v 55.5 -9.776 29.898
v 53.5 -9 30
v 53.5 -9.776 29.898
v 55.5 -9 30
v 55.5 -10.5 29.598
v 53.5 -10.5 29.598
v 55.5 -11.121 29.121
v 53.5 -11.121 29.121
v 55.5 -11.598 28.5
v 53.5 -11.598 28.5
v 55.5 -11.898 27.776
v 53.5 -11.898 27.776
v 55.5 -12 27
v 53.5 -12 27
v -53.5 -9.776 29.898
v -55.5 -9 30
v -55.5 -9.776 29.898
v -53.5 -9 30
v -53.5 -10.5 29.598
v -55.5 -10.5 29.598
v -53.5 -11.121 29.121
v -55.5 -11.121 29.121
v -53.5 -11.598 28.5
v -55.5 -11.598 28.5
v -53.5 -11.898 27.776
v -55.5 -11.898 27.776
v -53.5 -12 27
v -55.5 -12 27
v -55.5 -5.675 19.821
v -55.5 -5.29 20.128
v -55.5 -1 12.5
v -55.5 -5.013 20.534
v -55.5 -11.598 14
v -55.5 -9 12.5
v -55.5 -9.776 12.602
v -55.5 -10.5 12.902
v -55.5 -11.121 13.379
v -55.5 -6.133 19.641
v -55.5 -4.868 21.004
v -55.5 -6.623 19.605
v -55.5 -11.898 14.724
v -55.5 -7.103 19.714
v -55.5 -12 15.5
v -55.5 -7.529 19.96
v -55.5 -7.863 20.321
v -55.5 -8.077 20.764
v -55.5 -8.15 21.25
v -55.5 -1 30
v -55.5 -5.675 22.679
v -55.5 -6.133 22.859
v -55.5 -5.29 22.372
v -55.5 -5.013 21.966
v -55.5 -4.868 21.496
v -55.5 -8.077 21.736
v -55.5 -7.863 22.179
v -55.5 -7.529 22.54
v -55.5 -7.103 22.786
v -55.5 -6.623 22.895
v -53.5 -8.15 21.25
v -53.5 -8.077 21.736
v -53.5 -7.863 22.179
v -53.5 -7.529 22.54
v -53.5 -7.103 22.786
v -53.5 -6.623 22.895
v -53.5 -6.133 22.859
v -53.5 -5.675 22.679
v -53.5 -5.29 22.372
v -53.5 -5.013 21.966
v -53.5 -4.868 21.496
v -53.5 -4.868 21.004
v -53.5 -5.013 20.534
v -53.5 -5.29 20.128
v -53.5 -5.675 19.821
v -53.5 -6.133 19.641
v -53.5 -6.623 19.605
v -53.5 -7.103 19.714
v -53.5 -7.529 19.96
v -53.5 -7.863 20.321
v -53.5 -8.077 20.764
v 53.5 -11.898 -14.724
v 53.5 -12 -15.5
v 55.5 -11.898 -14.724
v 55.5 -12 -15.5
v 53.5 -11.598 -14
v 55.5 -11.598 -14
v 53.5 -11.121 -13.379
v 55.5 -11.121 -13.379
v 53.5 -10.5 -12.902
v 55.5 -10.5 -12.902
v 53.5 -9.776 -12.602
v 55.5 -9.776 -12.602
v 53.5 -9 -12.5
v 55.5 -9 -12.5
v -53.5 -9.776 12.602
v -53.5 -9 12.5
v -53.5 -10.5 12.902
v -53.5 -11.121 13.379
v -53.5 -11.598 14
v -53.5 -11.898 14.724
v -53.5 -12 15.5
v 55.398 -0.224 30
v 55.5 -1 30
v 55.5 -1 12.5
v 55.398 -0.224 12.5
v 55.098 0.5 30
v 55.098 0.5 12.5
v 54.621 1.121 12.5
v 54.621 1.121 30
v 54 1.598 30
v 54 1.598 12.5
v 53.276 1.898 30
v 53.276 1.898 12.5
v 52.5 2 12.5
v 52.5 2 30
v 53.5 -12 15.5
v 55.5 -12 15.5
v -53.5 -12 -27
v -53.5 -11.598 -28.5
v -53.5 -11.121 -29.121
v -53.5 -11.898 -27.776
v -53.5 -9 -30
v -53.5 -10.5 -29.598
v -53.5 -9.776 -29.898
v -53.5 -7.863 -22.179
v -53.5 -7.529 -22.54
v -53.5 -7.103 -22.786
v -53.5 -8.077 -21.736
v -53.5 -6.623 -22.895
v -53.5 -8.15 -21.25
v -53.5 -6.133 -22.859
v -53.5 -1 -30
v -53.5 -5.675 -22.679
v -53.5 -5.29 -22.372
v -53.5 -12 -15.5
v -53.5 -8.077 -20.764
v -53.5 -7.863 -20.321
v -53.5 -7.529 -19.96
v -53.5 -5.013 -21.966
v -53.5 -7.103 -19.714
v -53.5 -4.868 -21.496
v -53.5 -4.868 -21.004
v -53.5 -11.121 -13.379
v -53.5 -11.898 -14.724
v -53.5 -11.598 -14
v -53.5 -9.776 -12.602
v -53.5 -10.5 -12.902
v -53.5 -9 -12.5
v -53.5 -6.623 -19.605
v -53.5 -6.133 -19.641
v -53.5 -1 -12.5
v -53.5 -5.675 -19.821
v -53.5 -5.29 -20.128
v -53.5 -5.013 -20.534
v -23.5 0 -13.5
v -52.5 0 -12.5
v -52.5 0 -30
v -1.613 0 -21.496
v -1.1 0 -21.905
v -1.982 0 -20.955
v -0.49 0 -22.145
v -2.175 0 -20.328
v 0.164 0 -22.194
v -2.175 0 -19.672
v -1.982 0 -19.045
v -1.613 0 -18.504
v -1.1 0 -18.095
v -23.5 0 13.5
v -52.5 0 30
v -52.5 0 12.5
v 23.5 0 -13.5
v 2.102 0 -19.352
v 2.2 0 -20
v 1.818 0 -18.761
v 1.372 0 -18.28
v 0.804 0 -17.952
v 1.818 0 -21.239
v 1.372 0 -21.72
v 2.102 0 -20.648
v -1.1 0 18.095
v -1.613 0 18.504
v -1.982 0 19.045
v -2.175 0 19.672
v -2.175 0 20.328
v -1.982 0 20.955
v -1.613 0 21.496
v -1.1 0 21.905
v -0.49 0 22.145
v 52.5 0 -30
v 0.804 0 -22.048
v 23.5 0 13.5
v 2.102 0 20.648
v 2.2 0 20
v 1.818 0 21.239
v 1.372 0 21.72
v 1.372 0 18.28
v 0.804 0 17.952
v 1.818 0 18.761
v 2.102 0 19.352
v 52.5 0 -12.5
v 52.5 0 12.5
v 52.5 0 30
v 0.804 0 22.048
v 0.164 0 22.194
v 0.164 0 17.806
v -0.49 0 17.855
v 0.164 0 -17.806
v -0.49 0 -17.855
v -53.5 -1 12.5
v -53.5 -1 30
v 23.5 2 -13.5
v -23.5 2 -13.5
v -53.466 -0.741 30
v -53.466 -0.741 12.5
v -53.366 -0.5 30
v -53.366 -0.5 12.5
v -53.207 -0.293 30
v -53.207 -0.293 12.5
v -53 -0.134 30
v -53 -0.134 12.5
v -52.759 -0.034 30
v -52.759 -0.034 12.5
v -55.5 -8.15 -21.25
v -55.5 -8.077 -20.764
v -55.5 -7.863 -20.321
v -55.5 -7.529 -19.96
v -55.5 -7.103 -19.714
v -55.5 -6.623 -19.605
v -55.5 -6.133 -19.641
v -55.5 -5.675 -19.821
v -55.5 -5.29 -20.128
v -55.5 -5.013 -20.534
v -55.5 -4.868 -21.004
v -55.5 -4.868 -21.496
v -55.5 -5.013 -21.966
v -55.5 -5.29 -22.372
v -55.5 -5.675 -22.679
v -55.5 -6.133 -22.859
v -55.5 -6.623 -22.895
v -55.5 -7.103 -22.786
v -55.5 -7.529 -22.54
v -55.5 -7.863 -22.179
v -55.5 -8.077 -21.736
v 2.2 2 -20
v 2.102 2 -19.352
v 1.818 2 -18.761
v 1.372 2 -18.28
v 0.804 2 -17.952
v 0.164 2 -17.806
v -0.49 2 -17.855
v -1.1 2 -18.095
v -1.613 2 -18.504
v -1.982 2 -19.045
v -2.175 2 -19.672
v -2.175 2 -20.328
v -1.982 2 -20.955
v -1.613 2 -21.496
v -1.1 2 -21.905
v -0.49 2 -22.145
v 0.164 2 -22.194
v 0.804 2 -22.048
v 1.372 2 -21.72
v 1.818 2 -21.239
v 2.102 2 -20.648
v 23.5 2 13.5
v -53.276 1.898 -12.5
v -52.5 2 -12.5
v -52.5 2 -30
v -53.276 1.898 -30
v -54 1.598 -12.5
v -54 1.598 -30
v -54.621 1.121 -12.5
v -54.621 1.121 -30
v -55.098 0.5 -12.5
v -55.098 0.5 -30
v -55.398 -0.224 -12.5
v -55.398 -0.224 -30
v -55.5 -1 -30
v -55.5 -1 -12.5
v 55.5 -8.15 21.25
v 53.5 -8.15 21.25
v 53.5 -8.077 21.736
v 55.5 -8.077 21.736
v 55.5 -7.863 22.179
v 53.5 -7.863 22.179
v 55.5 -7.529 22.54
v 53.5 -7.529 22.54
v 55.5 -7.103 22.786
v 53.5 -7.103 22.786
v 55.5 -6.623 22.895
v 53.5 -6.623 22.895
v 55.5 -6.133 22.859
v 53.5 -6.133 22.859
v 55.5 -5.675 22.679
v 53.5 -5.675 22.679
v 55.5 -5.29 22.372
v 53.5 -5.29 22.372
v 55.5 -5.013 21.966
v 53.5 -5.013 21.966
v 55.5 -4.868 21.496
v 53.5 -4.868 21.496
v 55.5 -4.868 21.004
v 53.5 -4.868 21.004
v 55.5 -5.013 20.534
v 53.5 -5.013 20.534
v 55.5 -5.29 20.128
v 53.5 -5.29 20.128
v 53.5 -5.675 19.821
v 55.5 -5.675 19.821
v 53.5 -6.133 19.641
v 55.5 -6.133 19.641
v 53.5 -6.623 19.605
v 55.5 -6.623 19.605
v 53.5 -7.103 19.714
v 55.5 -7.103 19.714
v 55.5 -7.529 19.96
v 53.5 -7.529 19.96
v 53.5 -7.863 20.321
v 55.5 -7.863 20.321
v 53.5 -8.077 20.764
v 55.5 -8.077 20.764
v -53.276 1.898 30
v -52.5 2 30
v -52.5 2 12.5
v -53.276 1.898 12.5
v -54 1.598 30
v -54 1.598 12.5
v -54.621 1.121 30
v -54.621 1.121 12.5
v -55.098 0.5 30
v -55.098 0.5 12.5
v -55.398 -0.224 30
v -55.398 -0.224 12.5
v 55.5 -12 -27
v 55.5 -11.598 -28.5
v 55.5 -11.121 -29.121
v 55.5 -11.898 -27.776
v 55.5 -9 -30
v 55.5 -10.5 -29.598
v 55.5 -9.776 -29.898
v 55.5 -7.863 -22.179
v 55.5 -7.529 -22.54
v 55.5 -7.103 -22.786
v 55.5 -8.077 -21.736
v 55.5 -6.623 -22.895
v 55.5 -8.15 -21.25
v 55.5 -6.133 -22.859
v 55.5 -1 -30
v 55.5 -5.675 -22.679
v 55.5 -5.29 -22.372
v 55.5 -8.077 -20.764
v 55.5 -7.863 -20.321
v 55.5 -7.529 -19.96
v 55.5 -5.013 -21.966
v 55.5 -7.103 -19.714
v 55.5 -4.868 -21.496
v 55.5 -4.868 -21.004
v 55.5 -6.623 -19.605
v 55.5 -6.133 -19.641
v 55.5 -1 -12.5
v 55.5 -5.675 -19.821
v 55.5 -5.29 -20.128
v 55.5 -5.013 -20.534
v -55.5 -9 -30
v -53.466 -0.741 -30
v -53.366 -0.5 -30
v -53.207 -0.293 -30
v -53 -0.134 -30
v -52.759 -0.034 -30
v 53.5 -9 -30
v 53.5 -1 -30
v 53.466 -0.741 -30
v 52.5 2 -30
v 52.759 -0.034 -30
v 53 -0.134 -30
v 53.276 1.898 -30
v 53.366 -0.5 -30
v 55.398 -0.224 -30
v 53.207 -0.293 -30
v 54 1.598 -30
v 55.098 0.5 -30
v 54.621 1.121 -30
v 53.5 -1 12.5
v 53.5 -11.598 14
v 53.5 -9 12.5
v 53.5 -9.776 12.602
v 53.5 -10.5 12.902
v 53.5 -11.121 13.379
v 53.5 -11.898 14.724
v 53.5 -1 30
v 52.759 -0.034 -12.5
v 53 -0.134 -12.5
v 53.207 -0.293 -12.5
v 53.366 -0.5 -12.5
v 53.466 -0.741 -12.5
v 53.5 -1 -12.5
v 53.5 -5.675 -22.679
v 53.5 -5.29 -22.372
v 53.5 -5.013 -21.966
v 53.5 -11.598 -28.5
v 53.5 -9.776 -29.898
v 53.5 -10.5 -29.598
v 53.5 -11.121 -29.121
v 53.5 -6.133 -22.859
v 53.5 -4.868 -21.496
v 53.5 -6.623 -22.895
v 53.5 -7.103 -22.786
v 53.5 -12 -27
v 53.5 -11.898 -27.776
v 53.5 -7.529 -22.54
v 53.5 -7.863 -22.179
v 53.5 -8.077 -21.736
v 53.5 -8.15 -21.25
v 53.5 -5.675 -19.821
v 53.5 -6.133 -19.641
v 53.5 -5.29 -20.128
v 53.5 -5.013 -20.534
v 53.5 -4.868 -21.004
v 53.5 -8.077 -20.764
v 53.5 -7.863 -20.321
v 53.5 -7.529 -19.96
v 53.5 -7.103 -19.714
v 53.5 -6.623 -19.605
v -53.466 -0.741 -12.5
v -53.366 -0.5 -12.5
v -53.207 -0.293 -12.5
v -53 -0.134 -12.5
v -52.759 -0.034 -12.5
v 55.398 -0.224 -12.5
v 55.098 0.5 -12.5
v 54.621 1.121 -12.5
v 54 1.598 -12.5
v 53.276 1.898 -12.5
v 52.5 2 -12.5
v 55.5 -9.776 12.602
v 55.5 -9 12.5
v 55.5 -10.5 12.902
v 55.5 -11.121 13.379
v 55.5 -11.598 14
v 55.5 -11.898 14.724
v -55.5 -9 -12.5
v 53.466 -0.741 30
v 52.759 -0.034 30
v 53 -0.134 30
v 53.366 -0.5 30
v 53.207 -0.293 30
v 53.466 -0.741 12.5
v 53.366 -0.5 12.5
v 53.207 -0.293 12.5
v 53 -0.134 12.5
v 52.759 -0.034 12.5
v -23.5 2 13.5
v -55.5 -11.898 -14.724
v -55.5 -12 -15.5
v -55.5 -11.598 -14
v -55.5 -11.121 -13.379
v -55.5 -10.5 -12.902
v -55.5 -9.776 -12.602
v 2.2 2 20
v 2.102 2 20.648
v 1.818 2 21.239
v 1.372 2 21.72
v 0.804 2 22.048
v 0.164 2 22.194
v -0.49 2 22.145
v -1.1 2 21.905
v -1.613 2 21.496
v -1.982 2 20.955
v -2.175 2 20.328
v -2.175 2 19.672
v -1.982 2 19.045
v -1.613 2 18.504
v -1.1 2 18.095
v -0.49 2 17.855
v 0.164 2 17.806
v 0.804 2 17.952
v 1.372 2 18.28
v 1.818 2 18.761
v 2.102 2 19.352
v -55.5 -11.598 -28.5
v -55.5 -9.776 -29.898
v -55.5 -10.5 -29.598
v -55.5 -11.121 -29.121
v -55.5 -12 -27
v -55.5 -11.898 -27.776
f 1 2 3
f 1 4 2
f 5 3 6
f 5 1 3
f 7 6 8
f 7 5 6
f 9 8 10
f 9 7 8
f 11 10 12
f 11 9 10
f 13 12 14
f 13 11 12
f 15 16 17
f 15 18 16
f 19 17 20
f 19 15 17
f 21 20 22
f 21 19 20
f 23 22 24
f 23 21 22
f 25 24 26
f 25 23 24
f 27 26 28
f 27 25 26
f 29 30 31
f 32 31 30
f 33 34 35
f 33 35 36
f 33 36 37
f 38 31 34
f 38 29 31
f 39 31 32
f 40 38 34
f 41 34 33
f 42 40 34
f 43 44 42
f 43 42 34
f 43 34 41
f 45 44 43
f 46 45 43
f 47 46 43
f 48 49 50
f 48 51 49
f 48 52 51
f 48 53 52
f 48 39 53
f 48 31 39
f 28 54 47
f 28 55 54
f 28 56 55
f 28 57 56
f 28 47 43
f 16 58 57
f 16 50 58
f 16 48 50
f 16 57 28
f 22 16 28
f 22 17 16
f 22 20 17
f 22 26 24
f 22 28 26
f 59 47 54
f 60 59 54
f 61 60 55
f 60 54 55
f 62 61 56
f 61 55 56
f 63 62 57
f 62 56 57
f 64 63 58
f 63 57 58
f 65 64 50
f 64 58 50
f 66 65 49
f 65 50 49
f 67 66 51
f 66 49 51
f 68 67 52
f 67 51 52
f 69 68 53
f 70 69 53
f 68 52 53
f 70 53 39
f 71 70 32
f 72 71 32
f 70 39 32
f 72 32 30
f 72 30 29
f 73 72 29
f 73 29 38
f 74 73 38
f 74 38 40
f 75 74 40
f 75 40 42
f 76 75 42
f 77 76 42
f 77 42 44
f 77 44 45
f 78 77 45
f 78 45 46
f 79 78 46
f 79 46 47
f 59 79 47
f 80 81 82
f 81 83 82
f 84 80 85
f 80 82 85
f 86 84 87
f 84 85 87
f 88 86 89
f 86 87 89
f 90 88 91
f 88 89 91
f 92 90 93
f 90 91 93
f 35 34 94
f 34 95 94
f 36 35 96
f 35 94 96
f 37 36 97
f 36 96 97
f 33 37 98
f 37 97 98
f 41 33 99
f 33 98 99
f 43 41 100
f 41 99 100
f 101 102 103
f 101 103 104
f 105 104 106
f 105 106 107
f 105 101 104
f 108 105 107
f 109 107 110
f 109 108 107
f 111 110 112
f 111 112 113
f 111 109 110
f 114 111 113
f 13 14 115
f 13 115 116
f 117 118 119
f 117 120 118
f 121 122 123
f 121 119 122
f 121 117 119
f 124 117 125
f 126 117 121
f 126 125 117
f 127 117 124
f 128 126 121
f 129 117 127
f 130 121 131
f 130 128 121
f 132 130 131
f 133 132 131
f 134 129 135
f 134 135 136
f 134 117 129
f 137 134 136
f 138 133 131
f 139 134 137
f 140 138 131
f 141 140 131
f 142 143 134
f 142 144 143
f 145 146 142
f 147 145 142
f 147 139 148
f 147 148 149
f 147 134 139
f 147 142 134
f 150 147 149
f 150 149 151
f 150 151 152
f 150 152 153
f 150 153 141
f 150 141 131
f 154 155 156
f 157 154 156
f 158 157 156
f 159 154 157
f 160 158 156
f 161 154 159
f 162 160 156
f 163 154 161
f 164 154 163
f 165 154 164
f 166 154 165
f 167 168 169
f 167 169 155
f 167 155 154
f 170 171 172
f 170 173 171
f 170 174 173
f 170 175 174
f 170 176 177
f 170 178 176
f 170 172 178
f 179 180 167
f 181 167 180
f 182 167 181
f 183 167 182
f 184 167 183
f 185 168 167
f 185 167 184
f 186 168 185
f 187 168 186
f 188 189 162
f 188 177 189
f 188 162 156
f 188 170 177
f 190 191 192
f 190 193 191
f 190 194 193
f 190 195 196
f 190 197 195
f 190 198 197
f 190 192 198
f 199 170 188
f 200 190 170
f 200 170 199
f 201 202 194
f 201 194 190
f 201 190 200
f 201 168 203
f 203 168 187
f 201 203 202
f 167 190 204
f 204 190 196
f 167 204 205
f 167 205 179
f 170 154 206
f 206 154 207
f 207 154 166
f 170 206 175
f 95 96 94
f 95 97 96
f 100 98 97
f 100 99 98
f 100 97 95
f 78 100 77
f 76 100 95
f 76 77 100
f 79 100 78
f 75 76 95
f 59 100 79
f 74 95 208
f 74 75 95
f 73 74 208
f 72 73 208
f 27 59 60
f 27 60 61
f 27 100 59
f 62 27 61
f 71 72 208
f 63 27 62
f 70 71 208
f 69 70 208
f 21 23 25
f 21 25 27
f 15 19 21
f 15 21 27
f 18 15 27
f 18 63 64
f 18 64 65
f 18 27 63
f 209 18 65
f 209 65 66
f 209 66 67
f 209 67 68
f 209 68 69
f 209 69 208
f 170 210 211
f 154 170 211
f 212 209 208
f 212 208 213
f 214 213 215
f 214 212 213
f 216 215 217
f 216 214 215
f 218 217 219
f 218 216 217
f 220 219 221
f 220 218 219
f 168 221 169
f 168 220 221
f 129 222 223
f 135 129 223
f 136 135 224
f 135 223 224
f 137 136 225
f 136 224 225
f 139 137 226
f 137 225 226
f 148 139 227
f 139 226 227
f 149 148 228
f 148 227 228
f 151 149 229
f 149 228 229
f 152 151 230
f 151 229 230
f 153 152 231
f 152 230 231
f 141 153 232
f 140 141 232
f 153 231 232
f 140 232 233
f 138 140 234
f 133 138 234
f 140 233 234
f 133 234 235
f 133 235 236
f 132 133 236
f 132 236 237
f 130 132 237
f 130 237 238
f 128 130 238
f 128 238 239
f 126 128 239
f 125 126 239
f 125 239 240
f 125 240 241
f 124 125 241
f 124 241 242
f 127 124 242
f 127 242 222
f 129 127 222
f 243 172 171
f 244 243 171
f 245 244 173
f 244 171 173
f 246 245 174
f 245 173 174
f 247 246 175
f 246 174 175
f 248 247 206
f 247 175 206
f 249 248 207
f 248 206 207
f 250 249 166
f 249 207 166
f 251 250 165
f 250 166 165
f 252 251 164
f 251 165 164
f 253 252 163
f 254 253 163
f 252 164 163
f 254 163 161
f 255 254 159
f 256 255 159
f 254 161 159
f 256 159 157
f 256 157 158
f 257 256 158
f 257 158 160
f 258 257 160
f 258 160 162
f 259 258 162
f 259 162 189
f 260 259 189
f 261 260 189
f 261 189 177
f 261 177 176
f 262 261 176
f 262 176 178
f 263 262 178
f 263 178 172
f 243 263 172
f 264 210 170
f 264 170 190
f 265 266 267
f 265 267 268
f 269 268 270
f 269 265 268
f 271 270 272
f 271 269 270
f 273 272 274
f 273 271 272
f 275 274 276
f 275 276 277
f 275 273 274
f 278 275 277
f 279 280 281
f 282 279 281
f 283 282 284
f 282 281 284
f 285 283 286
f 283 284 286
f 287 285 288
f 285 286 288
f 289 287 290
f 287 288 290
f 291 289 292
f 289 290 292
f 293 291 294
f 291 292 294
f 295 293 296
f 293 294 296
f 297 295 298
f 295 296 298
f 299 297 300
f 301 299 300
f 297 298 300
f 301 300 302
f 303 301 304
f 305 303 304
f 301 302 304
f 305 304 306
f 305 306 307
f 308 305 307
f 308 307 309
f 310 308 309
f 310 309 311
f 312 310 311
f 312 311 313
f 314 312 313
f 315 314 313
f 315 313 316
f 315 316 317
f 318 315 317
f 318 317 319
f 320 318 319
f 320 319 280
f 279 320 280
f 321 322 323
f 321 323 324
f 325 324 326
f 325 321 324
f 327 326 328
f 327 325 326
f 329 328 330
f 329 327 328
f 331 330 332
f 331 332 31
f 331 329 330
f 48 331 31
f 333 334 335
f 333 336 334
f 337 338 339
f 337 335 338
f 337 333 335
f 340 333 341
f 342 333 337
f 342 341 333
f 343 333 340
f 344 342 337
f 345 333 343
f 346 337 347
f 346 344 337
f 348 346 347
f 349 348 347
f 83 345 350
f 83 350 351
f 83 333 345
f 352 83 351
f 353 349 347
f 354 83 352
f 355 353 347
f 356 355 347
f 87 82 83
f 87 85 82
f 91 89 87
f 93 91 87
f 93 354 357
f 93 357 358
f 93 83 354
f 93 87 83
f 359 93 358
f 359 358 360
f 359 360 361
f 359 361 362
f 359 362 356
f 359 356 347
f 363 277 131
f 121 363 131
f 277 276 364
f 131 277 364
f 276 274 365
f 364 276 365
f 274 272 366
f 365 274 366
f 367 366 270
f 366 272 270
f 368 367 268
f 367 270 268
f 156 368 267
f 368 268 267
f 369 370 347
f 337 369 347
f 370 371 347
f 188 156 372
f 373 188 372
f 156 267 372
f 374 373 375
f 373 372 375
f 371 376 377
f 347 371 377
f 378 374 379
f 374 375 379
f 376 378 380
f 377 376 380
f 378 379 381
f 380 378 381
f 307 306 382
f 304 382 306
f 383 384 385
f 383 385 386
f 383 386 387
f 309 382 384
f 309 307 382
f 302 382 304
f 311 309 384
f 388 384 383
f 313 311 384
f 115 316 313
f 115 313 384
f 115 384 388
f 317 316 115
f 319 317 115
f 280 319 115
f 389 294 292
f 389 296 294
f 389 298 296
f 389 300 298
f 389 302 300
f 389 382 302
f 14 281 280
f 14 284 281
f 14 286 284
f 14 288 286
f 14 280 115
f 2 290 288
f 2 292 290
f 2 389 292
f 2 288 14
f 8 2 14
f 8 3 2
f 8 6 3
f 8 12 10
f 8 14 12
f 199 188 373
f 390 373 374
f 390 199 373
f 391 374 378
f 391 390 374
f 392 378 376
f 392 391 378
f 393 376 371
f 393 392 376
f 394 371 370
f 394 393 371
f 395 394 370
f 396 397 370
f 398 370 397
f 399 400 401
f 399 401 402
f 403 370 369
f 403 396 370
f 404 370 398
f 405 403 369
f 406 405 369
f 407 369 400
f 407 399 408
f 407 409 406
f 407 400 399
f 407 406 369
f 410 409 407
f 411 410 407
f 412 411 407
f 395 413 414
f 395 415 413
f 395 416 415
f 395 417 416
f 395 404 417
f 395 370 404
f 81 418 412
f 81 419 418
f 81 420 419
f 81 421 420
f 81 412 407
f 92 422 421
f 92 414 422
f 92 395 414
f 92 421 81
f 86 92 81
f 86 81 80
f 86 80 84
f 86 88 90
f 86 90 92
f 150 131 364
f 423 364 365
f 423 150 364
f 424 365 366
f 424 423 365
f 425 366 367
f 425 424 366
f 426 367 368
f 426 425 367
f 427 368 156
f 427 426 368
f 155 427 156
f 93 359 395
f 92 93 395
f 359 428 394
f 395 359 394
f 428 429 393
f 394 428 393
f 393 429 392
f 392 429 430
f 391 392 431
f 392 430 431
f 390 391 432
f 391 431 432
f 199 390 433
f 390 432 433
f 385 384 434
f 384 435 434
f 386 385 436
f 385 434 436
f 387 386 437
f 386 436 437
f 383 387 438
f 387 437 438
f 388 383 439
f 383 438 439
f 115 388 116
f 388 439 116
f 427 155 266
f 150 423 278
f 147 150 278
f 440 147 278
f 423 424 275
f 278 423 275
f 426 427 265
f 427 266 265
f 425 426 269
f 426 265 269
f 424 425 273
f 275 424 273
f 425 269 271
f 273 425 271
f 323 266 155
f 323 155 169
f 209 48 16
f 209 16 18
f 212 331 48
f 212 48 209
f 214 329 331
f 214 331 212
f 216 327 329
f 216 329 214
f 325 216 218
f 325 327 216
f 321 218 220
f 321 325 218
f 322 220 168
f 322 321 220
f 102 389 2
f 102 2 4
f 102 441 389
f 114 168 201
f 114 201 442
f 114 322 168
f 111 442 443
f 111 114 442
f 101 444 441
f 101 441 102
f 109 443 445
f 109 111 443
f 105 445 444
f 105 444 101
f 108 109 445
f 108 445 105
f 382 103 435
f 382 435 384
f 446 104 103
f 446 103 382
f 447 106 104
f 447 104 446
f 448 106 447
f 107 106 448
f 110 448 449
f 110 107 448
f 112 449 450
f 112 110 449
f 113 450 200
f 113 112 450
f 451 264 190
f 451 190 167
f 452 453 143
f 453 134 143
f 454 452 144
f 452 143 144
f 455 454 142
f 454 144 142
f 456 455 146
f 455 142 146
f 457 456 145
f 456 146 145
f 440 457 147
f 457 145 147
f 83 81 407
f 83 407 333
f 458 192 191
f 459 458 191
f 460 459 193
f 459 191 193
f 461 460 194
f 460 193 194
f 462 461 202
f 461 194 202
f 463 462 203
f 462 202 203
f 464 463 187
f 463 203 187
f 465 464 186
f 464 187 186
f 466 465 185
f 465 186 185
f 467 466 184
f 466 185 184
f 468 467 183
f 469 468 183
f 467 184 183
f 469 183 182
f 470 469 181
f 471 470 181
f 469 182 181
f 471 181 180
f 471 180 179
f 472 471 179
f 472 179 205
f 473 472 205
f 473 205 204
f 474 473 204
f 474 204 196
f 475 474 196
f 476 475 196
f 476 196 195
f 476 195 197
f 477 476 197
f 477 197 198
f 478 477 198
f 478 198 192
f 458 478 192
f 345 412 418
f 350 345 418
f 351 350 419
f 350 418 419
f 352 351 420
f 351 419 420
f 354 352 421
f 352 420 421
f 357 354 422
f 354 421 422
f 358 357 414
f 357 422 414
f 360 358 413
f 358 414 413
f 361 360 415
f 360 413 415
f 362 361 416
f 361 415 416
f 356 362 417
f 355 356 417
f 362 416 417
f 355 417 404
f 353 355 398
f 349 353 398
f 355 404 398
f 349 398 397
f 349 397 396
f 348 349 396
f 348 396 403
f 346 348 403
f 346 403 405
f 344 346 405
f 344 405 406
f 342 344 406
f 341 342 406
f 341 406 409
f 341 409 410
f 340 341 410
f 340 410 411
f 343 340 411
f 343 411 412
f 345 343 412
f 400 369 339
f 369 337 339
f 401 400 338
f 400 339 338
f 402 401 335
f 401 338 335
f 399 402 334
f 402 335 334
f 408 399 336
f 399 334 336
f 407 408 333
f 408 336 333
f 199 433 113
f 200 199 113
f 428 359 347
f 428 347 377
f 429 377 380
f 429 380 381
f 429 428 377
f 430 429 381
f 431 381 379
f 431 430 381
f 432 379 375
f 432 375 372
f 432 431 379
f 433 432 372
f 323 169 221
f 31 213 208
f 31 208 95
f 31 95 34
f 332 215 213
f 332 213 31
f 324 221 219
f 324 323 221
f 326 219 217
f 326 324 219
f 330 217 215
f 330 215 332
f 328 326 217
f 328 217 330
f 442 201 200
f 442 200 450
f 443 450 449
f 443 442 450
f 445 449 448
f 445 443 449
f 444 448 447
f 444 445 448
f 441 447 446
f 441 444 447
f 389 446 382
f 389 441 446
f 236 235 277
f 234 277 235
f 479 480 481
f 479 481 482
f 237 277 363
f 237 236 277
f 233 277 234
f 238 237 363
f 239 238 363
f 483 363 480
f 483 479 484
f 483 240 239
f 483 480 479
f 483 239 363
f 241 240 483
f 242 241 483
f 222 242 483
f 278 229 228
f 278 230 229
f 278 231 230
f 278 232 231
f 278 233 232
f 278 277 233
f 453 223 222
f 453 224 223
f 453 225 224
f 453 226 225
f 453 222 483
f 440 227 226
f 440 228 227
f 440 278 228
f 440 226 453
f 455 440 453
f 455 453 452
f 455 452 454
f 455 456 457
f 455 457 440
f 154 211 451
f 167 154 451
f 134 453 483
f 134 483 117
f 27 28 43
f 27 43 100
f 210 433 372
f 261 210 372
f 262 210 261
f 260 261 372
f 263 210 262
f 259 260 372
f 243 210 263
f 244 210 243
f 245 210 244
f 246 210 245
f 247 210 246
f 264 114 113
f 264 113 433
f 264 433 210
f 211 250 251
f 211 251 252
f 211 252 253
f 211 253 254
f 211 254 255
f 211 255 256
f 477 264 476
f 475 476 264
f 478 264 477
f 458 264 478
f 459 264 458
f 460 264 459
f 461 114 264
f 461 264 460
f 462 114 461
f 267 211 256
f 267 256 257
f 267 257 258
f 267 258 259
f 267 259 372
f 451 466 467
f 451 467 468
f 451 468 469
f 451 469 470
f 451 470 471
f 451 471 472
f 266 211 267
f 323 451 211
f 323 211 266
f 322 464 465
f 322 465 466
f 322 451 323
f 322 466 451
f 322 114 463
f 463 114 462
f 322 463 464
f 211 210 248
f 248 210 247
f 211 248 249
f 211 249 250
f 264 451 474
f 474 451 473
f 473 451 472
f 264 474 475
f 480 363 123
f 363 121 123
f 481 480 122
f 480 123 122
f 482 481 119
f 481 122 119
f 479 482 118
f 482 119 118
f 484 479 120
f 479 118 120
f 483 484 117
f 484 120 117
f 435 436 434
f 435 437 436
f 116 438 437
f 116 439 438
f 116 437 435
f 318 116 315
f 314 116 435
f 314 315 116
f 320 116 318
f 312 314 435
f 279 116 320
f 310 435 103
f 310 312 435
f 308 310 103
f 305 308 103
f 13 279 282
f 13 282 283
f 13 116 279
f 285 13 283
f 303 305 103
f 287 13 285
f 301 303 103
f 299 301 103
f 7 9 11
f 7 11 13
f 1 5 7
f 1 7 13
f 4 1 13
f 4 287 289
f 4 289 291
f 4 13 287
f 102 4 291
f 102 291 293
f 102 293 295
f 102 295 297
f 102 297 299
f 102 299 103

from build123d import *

# Parameters (mm, degrees)
F1_DEPTH = 30
F2_W     = 3
F2_H     = 25
F2_W_2   = 47
F2_H_2   = 27
F3_DEPTH = 14.001
F4_D     = 4.4
F6_D     = 3.3
F7_R     = 3


with BuildPart() as f1:
    # F0 (on Top) → F1 (new body, symmetric)
    with BuildSketch(Plane.XY):
        with BuildLine():
            Line((-52.5, 0), (52.5, 0))
            ThreePointArc((52.5, 0), (53.2071067812, -0.2928932188), (53.5, -1))
            Line((53.5, -1), (53.5, -12))
            Line((53.5, -12), (55.5, -12))
            Line((55.5, -12), (55.5, -1))
            ThreePointArc((55.5, -1), (54.6213203436, 1.1213203436), (52.5, 2))
            Line((52.5, 2), (-52.5, 2))
            ThreePointArc((-52.5, 2), (-54.6213203436, 1.1213203436), (-55.5, -1))
            Line((-55.5, -1), (-55.5, -12))
            Line((-55.5, -12), (-53.5, -12))
            Line((-53.5, -12), (-53.5, -1))
            ThreePointArc((-53.5, -1), (-53.2071067812, -0.2928932188), (-52.5, 0))
        make_face()
    extrude(amount=F1_DEPTH, both=True)

    # F2 (on face) → F3 (cut, through all)
    with BuildSketch(Plane(origin=(0, 2, 0), x_dir=(-1, 0, 0), z_dir=(0, 1, 0))):
        with Locations((-54, 0)):
            Rectangle(F2_W, F2_H)
        with Locations((54, 0)):
            Rectangle(F2_W, F2_H)
        Rectangle(F2_W_2, F2_H_2)
    extrude(amount=-F3_DEPTH, mode=Mode.SUBTRACT)

    # F4 (through all)
    with Locations(Plane(origin=(0, 2, 0), x_dir=(-1, 0, 0), z_dir=(0, 1, 0))):
        with Locations((0, 20), (0, -20)):
            Hole(F4_D / 2)

    # F6 (through all)
    with Locations(Plane.YZ.offset(55.5)):
        with Locations((-6.5, 21.25), (-6.5, -21.25)):
            Hole(F6_D / 2)

    # F7
    f7_edges = [f1.edges().sort_by_distance(p)[0] for p in [
        (-54.5, -12, 30),
        (-54.5, -12, 12.5),
        (-54.5, -12, -12.5),
        (-54.5, -12, -30),
        (54.5, -12, 30),
        (54.5, -12, 12.5),
        (54.5, -12, -12.5),
        (54.5, -12, -30),
    ]]
    fillet(f7_edges, radius=F7_R)


solid = f1.part
